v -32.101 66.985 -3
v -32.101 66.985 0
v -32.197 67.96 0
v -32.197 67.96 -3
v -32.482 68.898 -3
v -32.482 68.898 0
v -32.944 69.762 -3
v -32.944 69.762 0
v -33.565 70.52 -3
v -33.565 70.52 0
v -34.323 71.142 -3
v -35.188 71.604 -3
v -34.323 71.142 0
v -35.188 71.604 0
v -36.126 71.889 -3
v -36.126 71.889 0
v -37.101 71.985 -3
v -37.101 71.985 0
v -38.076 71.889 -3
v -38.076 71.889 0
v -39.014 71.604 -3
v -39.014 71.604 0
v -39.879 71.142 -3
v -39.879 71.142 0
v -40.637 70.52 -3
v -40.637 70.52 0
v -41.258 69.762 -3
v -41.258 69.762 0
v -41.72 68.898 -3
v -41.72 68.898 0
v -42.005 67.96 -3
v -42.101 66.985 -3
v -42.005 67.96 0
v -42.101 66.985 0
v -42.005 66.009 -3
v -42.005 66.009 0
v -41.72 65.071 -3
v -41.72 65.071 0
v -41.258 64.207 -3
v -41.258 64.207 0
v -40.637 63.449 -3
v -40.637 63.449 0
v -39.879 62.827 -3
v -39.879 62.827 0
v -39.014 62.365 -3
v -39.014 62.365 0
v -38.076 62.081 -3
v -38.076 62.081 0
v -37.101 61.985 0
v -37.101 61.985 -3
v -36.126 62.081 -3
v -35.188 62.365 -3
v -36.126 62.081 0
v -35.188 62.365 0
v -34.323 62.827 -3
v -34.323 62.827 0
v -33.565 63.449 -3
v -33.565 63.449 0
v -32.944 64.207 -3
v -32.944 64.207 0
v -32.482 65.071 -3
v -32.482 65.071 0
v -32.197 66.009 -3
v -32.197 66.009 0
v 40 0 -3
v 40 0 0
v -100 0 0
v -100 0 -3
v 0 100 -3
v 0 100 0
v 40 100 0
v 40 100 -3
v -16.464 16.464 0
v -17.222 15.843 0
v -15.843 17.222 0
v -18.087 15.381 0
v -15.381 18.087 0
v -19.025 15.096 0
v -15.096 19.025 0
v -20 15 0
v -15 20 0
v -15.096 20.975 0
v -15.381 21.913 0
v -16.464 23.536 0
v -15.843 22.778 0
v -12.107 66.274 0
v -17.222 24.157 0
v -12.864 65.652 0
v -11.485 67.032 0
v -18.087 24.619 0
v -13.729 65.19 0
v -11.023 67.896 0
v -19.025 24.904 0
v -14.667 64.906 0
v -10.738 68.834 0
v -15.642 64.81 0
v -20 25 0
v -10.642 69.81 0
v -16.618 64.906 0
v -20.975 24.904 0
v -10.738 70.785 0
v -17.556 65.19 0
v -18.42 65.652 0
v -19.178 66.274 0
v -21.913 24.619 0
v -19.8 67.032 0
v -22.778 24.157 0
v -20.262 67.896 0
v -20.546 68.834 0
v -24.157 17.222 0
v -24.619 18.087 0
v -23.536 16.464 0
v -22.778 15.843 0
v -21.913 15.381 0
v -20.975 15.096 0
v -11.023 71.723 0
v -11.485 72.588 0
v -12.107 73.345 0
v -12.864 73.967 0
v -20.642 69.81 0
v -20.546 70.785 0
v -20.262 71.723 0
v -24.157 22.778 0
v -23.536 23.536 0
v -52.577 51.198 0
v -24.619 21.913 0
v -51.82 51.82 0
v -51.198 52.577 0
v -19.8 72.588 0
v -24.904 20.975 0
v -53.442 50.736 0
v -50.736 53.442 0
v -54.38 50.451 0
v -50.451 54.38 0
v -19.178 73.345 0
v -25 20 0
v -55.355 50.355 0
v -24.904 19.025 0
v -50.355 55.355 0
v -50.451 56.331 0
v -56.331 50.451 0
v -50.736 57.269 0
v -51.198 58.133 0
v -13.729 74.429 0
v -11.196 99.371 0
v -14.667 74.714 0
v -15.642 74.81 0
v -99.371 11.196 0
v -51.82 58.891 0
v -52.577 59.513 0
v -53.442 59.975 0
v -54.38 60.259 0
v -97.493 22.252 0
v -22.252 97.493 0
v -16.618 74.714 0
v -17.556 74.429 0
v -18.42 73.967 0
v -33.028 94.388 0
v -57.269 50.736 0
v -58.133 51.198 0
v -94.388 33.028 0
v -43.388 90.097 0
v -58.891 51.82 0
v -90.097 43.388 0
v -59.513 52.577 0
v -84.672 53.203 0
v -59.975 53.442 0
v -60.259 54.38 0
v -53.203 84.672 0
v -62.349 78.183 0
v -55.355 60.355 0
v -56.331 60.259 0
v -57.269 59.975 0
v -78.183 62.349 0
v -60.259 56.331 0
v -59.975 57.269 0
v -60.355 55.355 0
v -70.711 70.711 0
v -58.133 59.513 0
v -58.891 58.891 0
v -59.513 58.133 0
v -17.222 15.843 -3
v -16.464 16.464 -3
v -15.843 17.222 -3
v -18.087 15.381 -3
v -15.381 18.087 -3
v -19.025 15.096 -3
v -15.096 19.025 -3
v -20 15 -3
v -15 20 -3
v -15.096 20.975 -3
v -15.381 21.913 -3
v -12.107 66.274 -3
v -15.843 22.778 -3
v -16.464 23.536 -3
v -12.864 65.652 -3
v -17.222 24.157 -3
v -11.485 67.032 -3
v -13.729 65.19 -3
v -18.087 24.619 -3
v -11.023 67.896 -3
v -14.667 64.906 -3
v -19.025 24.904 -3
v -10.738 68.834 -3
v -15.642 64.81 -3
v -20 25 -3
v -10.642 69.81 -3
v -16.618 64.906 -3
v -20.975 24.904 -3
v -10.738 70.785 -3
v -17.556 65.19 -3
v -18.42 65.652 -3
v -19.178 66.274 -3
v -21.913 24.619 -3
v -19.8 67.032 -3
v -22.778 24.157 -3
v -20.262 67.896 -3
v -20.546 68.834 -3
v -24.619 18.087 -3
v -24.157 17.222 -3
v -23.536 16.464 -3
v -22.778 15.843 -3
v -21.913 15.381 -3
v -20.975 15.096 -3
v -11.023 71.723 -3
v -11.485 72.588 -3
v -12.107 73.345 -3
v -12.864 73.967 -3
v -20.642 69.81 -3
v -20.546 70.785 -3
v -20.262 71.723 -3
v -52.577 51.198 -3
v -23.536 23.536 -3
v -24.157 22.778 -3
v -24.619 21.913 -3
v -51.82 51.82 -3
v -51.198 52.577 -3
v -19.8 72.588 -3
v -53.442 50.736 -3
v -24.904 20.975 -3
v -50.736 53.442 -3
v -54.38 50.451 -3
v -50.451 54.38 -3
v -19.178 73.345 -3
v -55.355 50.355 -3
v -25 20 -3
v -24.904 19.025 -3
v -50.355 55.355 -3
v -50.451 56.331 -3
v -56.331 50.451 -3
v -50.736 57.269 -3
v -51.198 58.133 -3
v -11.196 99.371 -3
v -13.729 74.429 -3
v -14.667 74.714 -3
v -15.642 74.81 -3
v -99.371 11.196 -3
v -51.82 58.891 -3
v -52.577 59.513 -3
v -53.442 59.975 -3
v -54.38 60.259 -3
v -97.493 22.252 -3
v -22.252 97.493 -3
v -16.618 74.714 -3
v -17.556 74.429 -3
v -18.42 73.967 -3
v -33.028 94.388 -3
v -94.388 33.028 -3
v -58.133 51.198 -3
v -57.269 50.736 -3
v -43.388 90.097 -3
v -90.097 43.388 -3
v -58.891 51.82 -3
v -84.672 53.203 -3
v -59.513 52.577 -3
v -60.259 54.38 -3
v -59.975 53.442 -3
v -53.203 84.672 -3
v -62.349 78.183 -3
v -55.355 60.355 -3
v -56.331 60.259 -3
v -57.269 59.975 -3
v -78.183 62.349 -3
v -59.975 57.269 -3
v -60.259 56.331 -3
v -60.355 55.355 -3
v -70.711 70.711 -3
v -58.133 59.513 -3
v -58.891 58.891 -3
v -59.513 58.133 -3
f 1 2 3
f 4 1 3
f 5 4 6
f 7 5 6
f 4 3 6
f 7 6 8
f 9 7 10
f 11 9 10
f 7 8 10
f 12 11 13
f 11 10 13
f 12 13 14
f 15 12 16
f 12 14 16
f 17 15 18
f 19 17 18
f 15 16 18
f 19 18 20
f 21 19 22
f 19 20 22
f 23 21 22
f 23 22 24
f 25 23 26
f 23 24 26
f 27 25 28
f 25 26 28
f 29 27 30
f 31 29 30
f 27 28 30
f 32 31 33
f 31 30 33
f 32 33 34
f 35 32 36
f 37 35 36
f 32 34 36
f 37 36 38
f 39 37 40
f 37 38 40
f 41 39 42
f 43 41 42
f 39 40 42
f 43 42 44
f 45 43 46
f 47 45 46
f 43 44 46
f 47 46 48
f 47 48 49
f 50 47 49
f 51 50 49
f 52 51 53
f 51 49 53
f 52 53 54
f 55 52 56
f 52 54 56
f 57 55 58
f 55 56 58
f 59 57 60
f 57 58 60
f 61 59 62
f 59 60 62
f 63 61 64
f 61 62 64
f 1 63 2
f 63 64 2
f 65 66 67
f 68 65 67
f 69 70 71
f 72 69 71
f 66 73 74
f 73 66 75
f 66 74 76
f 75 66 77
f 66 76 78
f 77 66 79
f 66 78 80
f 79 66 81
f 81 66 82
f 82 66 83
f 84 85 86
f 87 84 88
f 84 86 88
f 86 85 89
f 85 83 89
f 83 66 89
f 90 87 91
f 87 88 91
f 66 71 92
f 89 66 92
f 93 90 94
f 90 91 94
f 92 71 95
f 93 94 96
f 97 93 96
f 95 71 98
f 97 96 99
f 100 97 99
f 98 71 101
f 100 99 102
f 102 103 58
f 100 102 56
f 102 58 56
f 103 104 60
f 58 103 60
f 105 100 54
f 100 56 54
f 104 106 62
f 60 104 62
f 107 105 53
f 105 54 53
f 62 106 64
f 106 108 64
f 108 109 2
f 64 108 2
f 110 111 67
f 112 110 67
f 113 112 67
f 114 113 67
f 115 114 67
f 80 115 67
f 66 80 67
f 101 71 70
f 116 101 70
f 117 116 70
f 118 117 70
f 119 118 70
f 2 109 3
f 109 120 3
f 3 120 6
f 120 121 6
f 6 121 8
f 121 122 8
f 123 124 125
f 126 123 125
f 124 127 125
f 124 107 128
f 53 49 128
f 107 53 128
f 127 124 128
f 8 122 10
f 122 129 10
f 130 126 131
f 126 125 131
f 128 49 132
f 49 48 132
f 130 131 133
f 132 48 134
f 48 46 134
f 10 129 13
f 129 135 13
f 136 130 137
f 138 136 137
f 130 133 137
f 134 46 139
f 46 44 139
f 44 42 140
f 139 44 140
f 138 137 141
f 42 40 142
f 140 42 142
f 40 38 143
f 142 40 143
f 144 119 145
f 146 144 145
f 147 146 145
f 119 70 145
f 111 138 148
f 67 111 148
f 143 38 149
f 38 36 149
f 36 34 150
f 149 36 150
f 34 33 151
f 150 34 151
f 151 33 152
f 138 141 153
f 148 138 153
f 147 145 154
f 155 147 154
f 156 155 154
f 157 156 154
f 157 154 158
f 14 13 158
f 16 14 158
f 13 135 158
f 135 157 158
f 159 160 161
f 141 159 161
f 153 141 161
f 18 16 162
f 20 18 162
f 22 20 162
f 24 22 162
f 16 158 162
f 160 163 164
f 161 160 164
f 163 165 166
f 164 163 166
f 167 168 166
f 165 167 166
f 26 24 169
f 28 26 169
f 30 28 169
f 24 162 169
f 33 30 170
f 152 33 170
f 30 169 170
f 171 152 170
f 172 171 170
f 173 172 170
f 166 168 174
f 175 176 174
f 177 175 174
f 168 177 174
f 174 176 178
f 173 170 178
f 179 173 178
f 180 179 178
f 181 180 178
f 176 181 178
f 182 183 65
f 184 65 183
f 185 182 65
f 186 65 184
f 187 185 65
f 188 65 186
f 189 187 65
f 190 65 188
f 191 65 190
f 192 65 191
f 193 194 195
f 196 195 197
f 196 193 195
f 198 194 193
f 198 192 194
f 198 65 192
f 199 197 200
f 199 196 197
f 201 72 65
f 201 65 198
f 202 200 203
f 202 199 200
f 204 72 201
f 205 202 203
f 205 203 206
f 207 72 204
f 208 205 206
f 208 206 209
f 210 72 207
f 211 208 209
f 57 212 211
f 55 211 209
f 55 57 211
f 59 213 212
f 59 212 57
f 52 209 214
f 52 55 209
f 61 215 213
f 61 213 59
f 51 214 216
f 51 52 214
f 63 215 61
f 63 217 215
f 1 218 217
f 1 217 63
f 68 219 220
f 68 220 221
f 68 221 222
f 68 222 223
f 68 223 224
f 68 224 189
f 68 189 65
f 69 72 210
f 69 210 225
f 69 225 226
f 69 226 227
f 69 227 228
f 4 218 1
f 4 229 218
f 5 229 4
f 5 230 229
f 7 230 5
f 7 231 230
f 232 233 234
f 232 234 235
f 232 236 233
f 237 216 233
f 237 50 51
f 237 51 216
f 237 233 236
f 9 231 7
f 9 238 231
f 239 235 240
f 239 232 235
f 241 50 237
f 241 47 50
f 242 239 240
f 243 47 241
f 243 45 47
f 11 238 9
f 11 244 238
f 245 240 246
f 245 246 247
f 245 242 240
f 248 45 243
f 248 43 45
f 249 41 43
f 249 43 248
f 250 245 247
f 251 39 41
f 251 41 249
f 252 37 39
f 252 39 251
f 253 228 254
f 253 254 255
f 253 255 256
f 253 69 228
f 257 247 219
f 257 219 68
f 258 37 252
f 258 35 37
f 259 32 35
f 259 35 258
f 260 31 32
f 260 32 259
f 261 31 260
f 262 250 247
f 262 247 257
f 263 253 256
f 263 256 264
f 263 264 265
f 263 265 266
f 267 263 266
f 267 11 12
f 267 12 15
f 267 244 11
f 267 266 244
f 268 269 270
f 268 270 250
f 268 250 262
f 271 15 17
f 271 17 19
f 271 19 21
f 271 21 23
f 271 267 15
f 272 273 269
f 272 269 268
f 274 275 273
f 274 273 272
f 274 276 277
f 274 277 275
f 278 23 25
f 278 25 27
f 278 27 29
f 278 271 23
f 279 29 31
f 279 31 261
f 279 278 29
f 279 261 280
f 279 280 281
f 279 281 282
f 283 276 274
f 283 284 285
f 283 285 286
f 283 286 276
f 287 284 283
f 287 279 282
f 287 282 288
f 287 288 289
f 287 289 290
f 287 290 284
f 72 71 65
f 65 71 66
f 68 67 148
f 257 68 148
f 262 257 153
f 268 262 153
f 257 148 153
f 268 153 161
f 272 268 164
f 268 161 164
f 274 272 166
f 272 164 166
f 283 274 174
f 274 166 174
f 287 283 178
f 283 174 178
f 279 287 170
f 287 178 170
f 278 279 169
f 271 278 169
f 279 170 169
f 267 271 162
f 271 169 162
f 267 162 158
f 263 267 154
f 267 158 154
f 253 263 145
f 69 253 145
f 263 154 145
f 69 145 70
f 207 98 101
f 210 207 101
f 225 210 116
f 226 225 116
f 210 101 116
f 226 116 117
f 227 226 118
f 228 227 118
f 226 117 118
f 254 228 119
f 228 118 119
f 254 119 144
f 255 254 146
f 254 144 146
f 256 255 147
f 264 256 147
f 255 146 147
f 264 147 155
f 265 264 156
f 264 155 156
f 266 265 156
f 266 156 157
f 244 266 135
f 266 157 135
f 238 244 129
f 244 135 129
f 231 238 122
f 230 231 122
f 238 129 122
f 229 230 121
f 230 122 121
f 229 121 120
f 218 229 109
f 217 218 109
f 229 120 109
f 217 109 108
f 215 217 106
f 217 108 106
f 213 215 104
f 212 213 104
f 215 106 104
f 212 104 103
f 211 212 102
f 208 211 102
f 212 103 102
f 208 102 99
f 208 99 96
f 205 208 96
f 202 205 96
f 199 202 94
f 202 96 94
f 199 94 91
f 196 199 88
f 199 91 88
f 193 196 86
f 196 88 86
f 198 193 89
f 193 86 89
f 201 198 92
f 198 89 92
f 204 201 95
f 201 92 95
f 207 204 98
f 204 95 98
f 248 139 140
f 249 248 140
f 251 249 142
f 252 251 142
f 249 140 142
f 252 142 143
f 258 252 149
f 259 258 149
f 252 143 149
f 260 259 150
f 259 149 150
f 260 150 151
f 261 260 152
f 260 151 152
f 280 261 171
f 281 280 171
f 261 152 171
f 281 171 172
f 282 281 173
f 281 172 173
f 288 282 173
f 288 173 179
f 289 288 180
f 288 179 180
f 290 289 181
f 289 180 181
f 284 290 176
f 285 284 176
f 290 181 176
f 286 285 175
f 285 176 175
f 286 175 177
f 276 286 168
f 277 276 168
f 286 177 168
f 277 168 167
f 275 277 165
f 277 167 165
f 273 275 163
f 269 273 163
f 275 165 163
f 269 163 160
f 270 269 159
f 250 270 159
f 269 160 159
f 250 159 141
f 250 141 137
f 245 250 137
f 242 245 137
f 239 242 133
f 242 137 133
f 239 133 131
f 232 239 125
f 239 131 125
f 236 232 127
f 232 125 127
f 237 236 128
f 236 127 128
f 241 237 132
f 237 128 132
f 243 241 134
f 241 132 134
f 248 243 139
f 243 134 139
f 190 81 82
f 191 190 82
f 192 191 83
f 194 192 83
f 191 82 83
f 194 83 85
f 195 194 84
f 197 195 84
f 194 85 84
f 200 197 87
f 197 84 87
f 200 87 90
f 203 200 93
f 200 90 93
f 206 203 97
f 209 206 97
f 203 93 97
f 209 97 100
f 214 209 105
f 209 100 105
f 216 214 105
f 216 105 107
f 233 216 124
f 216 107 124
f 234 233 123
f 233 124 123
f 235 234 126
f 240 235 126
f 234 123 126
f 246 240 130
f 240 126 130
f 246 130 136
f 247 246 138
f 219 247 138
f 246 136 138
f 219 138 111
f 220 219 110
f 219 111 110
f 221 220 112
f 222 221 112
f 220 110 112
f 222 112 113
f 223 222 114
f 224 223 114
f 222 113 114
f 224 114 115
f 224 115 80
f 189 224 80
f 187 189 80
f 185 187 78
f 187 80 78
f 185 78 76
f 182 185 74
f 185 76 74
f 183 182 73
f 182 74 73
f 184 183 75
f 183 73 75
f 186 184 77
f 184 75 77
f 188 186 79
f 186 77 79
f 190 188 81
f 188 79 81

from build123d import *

# Parameters (mm, degrees)
ESBO_O1_R          = 5
FLANGE_BASE1_DEPTH = 3


# Sheet-metal steps are written as plain solids
with BuildPart() as part:
    # Esboço1 → Flange-base1 (new body)
    with BuildSketch(Plane.XY):
        with BuildLine():
            Line((0, 0), (-100, 0))
            ThreePointArc((-100, 0), (-70.710678119, 70.710678119), (0, 100))
            Line((0, 100), (40, 100))
            Line((40, 100), (40, 0))
            Line((40, 0), (0, 0))
        make_face()
        with Locations((-20, 20)):
            Circle(ESBO_O1_R, mode=Mode.SUBTRACT)
        with Locations((-55.355339059, 55.355339059)):
            Circle(ESBO_O1_R, mode=Mode.SUBTRACT)
        with Locations((-37.101007166, 66.984631039)):
            Circle(ESBO_O1_R, mode=Mode.SUBTRACT)
        with Locations((-15.642212863, 69.809734905)):
            Circle(ESBO_O1_R, mode=Mode.SUBTRACT)
    extrude(amount=-FLANGE_BASE1_DEPTH)


solid = part.part
